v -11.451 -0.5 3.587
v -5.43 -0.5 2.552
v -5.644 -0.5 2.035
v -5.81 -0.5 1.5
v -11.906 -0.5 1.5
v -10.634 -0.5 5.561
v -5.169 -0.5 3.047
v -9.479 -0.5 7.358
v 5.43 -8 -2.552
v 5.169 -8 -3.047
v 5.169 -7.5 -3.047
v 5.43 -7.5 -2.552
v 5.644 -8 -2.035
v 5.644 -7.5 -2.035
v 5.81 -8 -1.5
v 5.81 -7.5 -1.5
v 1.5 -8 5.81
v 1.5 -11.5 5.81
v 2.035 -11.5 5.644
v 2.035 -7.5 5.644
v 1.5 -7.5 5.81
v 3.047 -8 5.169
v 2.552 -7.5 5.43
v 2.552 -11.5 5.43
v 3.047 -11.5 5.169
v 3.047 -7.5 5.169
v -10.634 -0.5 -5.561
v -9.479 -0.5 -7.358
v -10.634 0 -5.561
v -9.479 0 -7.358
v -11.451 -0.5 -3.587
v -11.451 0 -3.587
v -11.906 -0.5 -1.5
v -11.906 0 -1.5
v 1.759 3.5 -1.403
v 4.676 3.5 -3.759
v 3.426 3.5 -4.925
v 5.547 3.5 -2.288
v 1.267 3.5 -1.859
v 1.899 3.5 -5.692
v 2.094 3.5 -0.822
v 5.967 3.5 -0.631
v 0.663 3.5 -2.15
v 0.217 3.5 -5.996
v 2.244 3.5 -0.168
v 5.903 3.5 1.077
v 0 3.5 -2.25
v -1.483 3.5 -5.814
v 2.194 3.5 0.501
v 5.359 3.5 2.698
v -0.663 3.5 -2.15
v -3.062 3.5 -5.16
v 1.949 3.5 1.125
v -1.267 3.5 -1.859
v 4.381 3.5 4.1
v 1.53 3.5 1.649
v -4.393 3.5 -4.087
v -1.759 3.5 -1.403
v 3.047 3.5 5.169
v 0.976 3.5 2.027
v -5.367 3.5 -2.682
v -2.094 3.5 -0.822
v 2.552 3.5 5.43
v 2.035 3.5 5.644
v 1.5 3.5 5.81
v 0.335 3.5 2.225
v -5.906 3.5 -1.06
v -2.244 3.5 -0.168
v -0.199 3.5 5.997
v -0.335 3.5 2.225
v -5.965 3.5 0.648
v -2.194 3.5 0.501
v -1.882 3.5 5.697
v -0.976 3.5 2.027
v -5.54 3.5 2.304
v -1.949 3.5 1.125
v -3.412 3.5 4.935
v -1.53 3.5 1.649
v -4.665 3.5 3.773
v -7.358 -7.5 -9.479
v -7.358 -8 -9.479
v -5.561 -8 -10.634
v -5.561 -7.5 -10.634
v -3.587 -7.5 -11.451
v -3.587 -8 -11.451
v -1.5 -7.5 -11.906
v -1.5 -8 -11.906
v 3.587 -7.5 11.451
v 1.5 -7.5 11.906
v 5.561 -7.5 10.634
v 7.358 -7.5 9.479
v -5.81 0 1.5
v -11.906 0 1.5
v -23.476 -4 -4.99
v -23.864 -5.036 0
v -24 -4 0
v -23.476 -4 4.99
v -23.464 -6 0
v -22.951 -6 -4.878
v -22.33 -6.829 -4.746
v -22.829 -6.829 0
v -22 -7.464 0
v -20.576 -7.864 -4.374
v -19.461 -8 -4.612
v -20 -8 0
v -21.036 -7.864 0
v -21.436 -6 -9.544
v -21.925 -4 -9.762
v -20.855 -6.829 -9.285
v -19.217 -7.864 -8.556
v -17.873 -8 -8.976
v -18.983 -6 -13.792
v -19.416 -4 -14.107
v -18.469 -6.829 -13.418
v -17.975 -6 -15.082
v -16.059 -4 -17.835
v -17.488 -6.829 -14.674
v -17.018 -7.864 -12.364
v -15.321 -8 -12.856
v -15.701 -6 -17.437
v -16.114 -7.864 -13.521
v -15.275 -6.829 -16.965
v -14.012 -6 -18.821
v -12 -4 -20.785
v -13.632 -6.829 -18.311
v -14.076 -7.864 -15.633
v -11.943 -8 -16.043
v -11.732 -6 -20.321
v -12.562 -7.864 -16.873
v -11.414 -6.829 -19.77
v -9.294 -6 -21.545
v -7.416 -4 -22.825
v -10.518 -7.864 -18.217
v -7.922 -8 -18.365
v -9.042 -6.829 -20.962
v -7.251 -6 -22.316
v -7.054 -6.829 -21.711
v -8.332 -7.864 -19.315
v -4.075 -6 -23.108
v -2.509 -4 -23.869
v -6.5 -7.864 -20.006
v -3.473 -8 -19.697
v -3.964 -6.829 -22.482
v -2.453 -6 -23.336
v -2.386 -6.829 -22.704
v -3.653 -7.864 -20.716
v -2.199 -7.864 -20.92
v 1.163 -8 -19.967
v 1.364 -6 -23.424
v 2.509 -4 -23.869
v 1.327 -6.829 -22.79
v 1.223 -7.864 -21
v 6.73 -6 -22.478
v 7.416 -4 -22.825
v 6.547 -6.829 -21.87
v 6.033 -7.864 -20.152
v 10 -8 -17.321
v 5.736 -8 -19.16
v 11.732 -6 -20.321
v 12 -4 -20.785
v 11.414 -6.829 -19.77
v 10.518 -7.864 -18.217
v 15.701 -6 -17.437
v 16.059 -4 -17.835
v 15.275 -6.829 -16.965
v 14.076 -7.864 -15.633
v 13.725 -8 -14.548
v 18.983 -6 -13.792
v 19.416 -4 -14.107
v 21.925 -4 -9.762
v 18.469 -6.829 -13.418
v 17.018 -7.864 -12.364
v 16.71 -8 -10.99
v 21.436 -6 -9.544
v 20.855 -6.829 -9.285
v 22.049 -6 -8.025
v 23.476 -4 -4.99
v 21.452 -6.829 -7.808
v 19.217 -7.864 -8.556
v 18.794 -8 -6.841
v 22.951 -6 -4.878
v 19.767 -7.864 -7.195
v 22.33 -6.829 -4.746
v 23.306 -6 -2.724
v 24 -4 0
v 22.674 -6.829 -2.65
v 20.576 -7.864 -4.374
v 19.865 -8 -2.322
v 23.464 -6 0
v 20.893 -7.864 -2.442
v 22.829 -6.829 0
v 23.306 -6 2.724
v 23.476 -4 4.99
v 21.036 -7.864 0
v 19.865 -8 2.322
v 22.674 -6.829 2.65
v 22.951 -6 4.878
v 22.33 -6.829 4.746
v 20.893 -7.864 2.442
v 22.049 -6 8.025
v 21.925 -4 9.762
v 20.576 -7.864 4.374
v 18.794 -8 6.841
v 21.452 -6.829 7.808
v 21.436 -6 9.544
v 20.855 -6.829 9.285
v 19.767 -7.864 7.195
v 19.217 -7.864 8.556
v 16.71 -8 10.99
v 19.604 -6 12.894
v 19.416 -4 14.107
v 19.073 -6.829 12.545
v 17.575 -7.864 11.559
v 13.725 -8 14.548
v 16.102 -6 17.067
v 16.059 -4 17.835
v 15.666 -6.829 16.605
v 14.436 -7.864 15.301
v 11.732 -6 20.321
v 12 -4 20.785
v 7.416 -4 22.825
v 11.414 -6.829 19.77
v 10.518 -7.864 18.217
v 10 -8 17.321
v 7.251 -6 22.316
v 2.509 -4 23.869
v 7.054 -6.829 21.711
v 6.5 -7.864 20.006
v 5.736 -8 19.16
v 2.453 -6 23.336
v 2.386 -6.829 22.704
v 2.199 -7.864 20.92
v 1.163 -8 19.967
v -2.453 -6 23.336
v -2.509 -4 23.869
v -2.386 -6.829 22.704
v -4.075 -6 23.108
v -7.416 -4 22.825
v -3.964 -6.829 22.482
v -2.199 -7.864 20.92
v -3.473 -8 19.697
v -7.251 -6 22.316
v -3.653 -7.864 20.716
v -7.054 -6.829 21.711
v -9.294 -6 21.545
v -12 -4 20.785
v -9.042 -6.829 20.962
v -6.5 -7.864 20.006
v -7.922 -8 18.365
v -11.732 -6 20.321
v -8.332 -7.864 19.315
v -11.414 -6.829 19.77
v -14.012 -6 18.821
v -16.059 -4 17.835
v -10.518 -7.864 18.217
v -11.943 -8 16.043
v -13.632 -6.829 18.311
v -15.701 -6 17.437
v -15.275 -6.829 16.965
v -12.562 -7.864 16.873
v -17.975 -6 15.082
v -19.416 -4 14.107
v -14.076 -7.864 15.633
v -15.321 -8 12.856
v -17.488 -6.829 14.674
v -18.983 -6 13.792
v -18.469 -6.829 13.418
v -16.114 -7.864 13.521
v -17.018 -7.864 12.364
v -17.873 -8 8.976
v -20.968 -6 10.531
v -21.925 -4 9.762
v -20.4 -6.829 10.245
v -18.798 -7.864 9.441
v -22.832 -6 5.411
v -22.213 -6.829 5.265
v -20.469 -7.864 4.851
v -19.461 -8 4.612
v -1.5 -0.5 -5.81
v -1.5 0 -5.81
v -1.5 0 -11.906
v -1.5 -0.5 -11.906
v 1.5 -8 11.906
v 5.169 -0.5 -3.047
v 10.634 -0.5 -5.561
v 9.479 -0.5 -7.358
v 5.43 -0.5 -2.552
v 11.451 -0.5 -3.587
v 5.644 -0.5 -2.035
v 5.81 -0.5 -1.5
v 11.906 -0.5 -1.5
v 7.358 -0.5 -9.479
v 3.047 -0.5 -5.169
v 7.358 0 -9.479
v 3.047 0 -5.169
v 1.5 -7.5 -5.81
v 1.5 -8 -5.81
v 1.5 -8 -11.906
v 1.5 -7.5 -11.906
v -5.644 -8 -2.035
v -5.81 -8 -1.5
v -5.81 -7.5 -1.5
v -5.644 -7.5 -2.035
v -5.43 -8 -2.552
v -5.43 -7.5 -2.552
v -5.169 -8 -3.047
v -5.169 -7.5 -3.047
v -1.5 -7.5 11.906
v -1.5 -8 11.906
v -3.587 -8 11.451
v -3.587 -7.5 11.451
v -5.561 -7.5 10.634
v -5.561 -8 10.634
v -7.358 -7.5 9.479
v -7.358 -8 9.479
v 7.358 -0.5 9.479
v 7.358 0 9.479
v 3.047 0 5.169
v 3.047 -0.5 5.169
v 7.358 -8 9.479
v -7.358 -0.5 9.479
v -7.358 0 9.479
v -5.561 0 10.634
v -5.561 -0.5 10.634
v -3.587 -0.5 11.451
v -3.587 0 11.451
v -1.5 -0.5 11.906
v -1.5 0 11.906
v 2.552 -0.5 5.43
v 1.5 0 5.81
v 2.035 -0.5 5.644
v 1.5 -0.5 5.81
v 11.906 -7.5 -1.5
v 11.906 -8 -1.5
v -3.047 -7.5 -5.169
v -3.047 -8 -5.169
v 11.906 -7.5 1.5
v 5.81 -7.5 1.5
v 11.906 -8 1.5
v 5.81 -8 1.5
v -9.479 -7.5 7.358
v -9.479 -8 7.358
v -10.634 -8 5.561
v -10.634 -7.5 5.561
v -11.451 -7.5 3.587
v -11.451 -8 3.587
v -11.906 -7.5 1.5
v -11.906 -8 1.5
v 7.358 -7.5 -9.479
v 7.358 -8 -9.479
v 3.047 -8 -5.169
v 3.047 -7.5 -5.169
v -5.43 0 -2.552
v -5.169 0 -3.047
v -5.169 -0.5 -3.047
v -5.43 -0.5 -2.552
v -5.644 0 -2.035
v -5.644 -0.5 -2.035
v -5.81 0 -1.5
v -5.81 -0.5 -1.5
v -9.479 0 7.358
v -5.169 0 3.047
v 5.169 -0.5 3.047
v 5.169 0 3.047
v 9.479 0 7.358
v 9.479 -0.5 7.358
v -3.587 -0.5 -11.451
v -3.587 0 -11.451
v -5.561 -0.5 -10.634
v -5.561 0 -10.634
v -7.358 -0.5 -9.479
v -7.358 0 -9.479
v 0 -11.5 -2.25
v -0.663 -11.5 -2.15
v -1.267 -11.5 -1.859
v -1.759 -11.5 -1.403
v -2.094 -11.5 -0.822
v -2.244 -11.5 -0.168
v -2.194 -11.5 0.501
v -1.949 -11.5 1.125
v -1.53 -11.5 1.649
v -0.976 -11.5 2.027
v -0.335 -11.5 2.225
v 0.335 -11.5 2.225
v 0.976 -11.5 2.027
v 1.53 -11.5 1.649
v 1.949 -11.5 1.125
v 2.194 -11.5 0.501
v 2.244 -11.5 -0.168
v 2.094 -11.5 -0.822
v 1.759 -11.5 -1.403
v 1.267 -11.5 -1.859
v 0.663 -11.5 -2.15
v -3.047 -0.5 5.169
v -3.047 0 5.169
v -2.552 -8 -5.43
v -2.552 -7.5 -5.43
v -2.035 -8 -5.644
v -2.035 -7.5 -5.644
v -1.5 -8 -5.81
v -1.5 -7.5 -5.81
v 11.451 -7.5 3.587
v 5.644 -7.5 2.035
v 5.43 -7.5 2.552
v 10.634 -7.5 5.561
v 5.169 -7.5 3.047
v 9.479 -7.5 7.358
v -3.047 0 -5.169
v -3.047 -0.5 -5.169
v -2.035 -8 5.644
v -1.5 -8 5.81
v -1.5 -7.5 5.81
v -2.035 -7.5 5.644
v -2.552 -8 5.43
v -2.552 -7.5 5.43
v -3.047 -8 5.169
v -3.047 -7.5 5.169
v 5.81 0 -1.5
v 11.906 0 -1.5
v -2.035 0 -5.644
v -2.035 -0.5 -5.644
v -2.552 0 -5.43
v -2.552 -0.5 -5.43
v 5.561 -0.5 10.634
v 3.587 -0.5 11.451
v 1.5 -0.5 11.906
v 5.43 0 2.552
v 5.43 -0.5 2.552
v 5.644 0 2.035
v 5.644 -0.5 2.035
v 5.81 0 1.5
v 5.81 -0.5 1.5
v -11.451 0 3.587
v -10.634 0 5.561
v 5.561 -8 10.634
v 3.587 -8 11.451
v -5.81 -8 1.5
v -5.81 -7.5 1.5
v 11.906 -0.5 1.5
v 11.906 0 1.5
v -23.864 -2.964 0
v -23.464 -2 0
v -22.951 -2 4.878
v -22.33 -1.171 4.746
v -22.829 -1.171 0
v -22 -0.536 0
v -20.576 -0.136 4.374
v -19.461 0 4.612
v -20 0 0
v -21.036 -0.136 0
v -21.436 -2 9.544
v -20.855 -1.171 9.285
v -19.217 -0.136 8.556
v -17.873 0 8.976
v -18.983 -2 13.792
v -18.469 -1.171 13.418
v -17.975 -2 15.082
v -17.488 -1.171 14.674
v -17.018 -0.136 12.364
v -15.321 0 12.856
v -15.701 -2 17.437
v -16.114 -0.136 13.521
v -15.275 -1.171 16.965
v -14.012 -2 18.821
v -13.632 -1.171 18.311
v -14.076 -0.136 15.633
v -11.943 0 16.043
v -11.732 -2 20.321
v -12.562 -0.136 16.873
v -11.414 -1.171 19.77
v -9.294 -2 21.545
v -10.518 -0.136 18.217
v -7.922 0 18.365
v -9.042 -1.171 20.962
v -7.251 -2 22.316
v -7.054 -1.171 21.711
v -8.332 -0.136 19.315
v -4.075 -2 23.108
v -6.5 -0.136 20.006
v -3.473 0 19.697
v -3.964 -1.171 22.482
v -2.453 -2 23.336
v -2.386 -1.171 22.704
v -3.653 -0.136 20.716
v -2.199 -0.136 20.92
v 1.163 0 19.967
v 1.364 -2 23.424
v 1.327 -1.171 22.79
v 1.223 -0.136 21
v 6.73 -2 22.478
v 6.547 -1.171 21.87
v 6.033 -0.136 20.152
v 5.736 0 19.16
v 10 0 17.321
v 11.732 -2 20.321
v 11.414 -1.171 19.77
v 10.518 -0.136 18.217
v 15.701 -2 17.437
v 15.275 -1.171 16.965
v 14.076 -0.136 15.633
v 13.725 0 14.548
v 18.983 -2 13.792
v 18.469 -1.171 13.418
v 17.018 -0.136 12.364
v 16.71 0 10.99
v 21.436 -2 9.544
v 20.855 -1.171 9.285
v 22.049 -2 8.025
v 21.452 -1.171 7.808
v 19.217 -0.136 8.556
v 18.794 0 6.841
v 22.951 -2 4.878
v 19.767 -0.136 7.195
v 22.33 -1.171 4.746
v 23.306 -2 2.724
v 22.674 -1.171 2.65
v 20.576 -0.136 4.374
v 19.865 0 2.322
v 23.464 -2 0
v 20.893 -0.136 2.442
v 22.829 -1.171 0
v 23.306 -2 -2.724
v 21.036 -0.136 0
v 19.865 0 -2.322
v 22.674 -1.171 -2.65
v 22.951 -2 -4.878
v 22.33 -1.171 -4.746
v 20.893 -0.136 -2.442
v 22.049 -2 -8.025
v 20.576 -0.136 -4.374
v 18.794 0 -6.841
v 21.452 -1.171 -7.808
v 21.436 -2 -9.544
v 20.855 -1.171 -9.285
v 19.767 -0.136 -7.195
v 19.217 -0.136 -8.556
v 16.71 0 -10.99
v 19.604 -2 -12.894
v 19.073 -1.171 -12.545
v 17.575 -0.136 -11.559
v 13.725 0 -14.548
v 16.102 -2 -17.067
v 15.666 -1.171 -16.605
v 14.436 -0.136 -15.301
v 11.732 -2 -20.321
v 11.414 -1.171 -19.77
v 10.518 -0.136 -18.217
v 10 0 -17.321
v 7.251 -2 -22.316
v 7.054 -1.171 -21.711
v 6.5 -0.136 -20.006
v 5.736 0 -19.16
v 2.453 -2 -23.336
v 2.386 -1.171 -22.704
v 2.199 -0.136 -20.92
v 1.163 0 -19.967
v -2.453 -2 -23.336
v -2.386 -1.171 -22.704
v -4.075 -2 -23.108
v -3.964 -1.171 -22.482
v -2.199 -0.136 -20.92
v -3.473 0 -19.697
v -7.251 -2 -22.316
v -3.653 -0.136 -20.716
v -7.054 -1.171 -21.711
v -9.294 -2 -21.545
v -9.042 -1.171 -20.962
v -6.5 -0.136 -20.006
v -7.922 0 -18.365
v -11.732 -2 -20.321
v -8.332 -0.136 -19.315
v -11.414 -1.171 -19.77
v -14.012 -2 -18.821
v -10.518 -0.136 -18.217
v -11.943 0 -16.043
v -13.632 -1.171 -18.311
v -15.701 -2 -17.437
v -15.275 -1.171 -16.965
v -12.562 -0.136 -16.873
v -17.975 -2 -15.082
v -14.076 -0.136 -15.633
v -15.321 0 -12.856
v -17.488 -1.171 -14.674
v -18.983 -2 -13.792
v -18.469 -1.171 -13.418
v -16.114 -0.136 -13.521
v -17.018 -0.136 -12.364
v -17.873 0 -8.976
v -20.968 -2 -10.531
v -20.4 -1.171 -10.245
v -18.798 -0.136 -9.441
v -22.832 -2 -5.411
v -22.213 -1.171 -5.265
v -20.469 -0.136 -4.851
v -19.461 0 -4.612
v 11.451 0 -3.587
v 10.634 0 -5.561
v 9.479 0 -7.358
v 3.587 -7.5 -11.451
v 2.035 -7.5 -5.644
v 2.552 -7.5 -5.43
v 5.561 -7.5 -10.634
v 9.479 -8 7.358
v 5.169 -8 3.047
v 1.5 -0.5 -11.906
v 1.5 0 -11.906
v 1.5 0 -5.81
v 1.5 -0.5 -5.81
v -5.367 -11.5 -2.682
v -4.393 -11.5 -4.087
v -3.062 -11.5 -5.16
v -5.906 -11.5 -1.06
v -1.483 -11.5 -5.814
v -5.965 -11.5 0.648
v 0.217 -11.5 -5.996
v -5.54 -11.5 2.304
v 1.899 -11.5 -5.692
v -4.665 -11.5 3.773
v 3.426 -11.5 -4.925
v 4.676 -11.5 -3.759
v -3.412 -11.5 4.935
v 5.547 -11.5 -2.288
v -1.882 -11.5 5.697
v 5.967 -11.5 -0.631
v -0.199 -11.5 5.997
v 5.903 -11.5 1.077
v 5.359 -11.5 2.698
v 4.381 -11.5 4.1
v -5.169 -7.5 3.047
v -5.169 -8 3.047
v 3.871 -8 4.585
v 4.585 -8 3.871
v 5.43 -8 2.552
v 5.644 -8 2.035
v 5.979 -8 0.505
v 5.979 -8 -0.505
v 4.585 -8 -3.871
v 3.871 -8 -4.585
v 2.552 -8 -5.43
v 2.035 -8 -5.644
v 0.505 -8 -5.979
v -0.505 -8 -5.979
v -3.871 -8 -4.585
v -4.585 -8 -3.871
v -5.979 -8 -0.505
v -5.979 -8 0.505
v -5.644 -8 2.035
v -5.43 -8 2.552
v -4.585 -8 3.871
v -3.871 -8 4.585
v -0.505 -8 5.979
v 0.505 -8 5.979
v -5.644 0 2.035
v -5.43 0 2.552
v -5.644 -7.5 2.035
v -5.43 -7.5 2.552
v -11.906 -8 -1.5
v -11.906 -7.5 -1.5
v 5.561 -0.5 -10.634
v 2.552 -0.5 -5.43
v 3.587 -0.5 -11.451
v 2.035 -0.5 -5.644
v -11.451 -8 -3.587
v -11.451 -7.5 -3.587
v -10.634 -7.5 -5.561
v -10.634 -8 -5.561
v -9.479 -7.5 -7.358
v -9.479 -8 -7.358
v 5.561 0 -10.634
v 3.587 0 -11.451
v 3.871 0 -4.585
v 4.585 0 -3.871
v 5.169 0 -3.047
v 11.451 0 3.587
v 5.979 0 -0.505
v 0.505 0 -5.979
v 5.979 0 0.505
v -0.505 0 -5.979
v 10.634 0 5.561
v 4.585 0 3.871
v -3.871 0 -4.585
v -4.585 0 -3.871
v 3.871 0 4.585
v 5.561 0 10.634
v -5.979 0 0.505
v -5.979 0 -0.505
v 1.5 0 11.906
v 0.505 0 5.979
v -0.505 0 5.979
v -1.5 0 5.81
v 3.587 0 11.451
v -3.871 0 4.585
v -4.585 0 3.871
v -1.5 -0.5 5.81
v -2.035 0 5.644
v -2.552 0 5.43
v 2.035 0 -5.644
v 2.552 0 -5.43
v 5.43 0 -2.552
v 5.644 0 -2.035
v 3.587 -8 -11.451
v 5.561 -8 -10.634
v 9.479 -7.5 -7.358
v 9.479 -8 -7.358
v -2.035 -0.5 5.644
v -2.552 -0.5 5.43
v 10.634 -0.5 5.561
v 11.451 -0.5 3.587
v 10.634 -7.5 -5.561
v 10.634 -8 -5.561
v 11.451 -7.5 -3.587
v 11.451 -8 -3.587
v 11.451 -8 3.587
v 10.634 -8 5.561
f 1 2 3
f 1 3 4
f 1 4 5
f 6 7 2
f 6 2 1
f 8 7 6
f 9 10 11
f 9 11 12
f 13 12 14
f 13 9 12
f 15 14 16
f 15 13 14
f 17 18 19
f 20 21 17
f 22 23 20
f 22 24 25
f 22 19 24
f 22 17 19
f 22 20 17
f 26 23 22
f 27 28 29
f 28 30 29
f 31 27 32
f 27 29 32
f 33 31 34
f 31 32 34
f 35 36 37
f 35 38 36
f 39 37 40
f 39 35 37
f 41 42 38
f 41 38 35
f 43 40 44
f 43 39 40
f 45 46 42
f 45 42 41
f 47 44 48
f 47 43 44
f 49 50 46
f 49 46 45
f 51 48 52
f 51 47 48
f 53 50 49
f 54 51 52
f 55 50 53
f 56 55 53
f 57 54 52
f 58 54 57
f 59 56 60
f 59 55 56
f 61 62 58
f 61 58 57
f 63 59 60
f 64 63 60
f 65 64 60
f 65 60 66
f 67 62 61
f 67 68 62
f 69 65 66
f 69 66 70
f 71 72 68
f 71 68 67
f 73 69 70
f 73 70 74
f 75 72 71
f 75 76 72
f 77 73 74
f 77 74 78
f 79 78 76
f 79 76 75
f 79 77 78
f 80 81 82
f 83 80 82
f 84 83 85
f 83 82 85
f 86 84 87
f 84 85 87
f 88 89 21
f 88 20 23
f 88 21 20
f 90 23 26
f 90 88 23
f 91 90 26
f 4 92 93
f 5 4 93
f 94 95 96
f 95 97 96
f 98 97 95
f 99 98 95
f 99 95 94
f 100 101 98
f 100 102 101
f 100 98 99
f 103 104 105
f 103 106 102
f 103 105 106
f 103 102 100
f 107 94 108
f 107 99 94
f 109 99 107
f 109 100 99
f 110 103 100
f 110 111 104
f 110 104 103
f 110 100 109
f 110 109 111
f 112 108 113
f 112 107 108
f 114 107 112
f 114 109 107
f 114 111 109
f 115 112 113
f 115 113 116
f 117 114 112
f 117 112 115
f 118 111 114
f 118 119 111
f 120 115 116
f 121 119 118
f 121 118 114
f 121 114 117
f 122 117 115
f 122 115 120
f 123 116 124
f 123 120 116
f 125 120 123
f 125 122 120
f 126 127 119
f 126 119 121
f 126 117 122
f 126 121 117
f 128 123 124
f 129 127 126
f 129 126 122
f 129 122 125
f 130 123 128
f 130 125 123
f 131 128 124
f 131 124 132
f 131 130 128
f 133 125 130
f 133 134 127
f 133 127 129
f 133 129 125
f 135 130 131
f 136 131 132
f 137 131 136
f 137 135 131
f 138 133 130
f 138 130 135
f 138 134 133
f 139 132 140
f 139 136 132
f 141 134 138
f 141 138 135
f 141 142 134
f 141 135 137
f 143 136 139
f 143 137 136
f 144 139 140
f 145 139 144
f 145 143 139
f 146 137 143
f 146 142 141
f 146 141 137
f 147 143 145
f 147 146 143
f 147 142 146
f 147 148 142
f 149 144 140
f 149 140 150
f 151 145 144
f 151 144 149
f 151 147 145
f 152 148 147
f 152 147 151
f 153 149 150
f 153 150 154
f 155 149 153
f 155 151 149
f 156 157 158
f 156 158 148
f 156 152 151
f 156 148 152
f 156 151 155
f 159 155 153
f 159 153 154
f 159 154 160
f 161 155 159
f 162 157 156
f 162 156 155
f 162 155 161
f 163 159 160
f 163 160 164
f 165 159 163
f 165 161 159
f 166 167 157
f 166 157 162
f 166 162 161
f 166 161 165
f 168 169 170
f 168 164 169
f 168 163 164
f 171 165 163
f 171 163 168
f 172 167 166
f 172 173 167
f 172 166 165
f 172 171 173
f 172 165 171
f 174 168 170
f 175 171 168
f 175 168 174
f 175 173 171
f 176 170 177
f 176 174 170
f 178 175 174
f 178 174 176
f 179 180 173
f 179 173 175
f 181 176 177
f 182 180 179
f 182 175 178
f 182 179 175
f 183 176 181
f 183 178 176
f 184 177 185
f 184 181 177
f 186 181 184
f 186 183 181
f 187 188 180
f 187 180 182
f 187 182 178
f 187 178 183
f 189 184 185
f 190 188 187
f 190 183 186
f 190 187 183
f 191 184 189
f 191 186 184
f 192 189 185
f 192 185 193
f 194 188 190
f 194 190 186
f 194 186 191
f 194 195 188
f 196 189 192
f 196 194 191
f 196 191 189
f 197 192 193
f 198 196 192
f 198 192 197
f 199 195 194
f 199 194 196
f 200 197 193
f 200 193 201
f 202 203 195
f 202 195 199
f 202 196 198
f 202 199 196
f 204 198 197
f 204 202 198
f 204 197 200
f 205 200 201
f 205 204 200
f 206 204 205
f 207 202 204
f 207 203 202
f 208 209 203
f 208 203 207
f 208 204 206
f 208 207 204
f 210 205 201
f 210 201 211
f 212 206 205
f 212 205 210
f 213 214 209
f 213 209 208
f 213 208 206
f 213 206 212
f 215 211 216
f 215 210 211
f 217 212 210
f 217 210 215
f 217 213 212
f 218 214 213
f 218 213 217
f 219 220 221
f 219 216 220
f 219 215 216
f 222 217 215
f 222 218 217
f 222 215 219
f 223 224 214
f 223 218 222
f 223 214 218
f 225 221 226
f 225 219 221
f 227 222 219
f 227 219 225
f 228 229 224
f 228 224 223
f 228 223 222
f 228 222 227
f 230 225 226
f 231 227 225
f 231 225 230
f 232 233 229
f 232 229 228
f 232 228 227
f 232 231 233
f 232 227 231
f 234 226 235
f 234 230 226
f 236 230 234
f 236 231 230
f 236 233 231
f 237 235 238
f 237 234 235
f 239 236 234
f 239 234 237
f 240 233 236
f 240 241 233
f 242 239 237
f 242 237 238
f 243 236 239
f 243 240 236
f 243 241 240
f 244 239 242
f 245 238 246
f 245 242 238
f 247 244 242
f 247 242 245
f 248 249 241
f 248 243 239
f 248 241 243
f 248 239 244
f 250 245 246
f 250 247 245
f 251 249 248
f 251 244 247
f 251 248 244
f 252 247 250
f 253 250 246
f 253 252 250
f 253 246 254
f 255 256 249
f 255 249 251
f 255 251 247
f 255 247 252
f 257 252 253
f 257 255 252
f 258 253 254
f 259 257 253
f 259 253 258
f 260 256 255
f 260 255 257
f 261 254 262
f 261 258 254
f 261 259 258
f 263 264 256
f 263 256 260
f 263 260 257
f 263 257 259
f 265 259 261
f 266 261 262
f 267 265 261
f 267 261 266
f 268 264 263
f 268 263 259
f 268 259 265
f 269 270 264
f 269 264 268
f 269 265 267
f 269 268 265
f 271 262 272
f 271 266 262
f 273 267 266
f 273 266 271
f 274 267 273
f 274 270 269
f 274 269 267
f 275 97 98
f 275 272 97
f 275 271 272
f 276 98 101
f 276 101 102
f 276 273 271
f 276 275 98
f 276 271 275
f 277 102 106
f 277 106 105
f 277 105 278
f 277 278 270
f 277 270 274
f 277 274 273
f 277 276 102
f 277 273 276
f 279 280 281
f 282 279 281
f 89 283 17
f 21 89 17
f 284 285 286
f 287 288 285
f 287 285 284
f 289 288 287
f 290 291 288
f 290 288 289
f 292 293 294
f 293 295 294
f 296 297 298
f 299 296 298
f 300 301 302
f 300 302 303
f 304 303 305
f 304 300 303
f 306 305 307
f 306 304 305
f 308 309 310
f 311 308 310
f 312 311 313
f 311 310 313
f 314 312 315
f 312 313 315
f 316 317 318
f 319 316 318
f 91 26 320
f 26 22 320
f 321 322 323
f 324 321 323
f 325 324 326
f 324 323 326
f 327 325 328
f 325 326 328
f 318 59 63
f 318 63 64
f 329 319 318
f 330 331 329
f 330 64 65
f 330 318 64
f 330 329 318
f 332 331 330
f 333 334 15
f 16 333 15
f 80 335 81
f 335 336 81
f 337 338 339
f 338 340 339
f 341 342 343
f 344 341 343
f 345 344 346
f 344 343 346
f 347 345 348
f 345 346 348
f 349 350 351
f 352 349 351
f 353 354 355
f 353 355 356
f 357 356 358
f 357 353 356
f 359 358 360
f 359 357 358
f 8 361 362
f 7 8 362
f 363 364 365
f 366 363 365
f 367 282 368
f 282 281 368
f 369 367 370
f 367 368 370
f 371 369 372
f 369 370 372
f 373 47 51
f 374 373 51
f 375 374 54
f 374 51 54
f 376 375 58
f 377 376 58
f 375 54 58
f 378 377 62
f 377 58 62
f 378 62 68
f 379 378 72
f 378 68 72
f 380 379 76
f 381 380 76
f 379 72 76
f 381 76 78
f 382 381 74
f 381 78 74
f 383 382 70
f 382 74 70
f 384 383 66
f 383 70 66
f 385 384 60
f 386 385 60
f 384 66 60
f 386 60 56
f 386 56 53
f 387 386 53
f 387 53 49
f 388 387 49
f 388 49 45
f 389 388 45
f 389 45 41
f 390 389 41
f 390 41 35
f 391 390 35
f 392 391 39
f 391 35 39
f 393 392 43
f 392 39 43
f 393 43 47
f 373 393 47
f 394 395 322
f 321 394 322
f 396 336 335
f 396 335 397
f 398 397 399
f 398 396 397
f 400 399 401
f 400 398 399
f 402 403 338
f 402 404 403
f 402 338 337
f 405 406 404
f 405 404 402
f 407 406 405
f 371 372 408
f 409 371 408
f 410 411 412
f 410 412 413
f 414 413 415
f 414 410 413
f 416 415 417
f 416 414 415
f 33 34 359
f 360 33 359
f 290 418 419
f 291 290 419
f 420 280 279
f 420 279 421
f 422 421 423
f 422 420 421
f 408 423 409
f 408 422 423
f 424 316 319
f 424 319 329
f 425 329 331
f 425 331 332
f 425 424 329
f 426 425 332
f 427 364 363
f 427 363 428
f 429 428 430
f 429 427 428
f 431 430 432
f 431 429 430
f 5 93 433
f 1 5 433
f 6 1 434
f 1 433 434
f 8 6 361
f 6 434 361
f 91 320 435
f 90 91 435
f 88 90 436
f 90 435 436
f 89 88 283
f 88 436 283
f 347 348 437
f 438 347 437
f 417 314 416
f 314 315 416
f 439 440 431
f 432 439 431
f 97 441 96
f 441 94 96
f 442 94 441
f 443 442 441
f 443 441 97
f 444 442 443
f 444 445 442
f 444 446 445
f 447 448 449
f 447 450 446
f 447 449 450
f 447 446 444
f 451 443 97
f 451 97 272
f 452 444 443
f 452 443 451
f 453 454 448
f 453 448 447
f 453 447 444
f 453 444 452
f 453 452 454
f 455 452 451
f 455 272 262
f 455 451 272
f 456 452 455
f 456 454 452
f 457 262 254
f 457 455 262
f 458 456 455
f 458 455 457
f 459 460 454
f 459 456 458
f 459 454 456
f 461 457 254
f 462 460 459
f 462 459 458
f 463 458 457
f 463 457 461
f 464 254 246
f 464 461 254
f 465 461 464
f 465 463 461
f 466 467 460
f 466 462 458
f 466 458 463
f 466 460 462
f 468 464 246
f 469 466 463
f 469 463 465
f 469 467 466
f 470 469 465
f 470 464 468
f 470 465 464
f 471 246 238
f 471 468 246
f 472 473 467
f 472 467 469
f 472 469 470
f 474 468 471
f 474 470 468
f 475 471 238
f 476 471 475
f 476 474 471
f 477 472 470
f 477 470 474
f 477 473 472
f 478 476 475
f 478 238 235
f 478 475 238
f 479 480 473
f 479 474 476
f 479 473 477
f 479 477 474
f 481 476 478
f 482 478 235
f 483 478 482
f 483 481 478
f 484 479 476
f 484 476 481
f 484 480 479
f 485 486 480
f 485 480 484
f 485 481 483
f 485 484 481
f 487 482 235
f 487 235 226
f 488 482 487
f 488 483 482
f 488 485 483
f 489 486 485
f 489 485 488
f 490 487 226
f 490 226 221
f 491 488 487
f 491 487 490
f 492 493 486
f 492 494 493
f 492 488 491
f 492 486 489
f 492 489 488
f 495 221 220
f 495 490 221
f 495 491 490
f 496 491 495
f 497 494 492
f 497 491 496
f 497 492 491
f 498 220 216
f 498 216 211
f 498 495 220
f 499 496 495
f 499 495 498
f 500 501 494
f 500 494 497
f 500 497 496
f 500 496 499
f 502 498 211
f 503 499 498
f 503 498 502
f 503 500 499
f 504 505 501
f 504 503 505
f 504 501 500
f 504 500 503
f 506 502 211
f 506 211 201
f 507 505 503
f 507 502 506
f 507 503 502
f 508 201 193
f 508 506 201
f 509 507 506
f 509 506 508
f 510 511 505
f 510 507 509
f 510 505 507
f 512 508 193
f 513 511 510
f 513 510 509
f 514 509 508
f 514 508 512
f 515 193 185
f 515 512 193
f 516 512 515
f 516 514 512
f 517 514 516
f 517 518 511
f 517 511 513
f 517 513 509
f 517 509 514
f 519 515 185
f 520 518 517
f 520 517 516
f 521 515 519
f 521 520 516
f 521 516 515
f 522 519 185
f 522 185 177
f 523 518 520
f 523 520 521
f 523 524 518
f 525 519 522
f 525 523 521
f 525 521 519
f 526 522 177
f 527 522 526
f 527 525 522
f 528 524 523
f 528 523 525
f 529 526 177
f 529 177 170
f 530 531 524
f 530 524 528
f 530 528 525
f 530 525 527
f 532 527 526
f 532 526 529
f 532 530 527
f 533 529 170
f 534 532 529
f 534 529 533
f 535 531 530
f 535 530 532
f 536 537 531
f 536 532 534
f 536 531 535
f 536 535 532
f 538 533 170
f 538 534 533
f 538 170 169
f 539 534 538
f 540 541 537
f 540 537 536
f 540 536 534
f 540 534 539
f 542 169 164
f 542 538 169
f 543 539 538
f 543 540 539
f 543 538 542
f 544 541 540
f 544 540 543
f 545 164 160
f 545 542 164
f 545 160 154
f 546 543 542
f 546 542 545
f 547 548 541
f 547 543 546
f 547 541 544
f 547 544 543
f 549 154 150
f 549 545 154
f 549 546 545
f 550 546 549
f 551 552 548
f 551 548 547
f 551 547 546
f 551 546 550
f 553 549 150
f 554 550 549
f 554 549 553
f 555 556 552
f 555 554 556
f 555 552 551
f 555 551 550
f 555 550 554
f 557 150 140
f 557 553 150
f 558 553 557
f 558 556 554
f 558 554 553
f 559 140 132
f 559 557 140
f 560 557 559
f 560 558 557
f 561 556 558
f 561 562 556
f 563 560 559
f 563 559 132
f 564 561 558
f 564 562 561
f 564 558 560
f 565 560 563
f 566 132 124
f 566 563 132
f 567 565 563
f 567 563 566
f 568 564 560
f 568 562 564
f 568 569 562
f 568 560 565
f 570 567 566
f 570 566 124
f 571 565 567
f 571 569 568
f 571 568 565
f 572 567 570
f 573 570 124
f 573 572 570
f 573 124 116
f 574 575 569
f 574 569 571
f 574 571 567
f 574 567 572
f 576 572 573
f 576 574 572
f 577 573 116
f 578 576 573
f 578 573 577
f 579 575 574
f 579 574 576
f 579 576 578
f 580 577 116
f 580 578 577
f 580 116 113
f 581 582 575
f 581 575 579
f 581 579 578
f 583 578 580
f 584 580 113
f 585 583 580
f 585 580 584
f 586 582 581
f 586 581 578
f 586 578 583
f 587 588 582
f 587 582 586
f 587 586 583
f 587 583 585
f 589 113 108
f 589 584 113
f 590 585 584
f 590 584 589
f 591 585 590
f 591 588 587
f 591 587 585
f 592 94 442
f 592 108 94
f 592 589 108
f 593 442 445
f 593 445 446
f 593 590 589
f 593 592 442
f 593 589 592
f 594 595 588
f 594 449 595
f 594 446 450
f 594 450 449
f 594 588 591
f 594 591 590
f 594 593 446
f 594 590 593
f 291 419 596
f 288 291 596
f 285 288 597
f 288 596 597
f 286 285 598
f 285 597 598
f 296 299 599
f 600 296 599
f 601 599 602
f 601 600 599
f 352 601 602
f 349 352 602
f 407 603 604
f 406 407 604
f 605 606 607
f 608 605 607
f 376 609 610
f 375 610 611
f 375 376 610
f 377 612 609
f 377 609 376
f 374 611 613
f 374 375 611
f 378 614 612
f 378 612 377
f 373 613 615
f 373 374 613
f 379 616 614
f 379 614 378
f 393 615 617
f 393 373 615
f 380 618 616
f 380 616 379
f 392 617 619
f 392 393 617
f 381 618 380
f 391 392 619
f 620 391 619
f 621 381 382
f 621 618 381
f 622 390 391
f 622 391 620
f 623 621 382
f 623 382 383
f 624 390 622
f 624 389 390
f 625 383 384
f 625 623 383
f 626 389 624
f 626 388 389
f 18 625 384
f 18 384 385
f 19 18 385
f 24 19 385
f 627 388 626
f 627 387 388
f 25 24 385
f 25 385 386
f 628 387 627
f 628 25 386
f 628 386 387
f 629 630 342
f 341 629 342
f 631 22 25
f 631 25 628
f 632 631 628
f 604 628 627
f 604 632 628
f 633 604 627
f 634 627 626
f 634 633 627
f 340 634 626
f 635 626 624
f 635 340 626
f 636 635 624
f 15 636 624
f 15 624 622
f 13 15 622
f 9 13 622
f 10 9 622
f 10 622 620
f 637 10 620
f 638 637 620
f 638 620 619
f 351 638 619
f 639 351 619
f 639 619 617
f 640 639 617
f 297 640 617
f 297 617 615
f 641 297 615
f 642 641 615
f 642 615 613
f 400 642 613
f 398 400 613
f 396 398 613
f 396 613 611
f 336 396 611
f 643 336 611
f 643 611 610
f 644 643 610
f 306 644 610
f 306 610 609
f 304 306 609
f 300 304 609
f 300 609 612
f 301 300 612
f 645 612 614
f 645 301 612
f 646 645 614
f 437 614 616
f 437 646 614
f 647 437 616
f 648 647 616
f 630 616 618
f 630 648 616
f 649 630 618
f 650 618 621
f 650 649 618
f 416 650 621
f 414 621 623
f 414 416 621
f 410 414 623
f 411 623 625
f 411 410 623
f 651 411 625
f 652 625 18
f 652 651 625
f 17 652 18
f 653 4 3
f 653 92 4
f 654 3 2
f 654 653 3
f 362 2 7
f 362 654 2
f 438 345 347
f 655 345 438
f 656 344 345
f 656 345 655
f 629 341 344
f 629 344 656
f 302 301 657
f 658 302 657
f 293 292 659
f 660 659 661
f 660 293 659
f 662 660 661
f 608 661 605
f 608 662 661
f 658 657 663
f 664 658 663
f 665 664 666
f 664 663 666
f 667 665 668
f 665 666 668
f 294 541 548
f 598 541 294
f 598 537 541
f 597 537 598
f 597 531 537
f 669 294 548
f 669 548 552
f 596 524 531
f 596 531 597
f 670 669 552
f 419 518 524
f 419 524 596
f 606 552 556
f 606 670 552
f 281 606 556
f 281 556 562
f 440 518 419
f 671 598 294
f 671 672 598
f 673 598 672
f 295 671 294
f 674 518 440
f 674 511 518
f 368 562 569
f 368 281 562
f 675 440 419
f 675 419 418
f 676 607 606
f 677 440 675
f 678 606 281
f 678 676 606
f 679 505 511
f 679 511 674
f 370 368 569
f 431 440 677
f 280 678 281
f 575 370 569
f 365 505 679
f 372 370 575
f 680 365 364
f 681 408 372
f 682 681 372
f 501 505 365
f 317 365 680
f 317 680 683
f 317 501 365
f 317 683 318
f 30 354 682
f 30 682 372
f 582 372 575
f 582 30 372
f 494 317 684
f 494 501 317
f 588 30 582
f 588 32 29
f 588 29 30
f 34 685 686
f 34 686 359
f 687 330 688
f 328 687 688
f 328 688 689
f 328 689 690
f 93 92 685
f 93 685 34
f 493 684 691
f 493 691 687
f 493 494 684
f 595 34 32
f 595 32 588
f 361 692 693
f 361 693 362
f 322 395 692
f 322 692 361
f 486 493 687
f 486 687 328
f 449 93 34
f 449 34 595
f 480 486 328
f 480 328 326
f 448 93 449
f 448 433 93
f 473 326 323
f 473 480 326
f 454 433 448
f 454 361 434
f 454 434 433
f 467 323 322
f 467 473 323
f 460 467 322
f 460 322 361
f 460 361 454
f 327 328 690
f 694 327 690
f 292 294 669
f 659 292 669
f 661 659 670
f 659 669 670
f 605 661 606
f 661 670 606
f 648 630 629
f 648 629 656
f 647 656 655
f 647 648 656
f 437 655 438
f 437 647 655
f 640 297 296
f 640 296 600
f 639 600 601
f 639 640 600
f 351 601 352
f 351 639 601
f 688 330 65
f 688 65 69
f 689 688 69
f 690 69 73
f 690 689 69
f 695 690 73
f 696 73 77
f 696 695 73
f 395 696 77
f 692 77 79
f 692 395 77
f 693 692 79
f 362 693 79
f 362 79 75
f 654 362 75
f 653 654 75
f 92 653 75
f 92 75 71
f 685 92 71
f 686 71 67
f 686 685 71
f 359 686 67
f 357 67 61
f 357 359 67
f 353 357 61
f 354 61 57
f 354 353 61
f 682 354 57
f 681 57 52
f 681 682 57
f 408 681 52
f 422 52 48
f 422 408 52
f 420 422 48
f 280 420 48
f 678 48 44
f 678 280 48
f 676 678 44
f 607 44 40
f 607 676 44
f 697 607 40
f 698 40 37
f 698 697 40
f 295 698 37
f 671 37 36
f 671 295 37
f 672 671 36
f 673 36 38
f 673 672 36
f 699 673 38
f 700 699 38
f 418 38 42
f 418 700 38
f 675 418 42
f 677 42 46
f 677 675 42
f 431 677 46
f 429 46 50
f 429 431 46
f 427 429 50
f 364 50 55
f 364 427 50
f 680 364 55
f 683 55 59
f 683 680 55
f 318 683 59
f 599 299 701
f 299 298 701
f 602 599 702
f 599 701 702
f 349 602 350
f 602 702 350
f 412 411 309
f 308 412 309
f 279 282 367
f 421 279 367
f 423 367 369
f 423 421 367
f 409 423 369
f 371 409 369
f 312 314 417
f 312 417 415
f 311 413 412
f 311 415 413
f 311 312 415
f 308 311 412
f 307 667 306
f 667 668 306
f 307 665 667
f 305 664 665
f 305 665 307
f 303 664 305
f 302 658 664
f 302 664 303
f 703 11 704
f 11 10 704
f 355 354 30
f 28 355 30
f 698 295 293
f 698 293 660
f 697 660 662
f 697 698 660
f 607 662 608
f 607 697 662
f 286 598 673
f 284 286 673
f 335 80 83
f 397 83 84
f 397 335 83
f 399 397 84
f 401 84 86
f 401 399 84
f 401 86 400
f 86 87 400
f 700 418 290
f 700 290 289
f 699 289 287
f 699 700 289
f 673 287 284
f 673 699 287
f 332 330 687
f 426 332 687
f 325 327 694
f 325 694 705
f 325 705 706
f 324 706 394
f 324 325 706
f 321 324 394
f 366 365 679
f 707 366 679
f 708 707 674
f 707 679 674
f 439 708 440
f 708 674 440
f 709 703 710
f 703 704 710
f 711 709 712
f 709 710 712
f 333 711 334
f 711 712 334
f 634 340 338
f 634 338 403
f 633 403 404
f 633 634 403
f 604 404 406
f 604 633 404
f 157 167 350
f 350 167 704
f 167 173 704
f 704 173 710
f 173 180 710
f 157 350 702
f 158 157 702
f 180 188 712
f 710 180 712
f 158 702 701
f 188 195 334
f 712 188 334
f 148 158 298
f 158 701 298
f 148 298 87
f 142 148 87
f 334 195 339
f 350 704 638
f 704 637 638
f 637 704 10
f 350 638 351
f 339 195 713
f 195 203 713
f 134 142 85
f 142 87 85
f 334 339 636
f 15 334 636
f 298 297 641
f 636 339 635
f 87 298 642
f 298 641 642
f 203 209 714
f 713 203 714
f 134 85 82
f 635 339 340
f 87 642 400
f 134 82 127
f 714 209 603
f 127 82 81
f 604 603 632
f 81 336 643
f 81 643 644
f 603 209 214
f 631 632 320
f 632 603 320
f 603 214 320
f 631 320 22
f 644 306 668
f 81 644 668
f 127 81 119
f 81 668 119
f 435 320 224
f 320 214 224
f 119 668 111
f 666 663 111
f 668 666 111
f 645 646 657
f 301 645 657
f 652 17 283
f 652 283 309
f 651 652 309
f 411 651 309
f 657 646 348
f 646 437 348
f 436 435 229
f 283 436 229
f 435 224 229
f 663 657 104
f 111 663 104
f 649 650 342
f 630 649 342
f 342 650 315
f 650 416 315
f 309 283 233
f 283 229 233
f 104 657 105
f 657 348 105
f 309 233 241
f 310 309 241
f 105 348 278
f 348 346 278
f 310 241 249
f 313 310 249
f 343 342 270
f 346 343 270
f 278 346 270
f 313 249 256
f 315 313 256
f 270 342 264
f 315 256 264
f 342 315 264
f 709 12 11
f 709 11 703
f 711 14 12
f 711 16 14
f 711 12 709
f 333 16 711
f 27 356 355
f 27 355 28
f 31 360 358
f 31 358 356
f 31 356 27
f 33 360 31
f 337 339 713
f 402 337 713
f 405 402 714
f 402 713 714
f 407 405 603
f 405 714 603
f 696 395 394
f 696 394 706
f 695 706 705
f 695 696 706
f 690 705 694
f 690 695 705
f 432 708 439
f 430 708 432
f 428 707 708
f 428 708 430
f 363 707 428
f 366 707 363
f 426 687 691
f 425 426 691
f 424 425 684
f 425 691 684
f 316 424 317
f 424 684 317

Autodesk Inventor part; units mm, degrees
ref_plane "YZ Plane" through (0, 0, 0) normal (1, 0, 0) x (0, 1, 0)
ref_plane "XZ Plane" through (0, 0, 0) normal (0, 1, 0) x (-1, 0, 0)
sketch "Sketch1" plane through (0, 0, 0) normal (0, 1, 0) x (-1, 0, 0)
  circle A0 centre (0, 0) radius 24
  dimension "d0" = 48
extrude "Extrusion1" add sketch "Sketch1" against normal blind 8
fillet "Fillet1" radius 4 2 edges at (24, 0, 0) (24, -8, 0)
sketch "Sketch2" plane through (0, -8, 0) normal (0, -1, 0) x (1, 0, 0)
  circle A0 centre (0, 0) radius 12
  line L0 (-7.3581, 9.4794) -> (-3.0473, 5.1686)
  arc A1 (-1.5, 5.8095) -> (-3.0473, 5.1686) centre (0, 0) ccw
  line L1 (-1.5, 5.8095) -> (-1.5, 11.9059)
  arc A2 (-1.5, 11.9059) -> (-7.3581, 9.4794) centre (0, 0) ccw
  line L2 (3.0473, 5.1686) -> (7.3581, 9.4794)
  arc A3 (7.3581, 9.4794) -> (1.5, 11.9059) centre (0, 0) ccw
  line L3 (1.5, 11.9059) -> (1.5, 5.8095)
  arc A4 (3.0473, 5.1686) -> (1.5, 5.8095) centre (0, 0) ccw
  line L4 (9.4794, 7.3581) -> (5.1686, 3.0473)
  arc A5 (5.8095, 1.5) -> (5.1686, 3.0473) centre (0, 0) ccw
  line L5 (5.8095, 1.5) -> (11.9059, 1.5)
  arc A6 (11.9059, 1.5) -> (9.4794, 7.3581) centre (0, 0) ccw
  line L6 (11.9059, -1.5) -> (5.8095, -1.5)
  arc A7 (5.1686, -3.0473) -> (5.8095, -1.5) centre (0, 0) ccw
  line L7 (5.1686, -3.0473) -> (9.4794, -7.3581)
  arc A8 (9.4794, -7.3581) -> (11.9059, -1.5) centre (0, 0) ccw
  line L8 (7.3581, -9.4794) -> (3.0473, -5.1686)
  arc A9 (1.5, -5.8095) -> (3.0473, -5.1686) centre (0, 0) ccw
  line L9 (1.5, -5.8095) -> (1.5, -11.9059)
  arc A10 (1.5, -11.9059) -> (7.3581, -9.4794) centre (0, 0) ccw
  line L10 (-3.0473, -5.1686) -> (-7.3581, -9.4794)
  arc A11 (-7.3581, -9.4794) -> (-1.5, -11.9059) centre (0, 0) ccw
  line L11 (-1.5, -11.9059) -> (-1.5, -5.8095)
  arc A12 (-3.0473, -5.1686) -> (-1.5, -5.8095) centre (0, 0) ccw
  line L12 (-9.4794, -7.3581) -> (-5.1686, -3.0473)
  arc A13 (-5.8095, -1.5) -> (-5.1686, -3.0473) centre (0, 0) ccw
  line L13 (-5.8095, -1.5) -> (-11.9059, -1.5)
  arc A14 (-11.9059, -1.5) -> (-9.4794, -7.3581) centre (0, 0) ccw
  line L14 (-5.1686, 3.0473) -> (-9.4794, 7.3581)
  arc A15 (-9.4794, 7.3581) -> (-11.9059, 1.5) centre (0, 0) ccw
  line L15 (-11.9059, 1.5) -> (-5.8095, 1.5)
  arc A16 (-5.1686, 3.0473) -> (-5.8095, 1.5) centre (0, 0) ccw
  circle A17 centre (0, 0) radius 6
  circle A18 centre (0, 0) radius 2.1
  point P0 (-6, 0)
extrude "Extrusion2" cut sketch "Sketch2" against normal blind 0.5 contours L5 A5 L4 A0 | A0 L7 A7 L6 | L2 A4 L3 A0 | A0 L9 A9 L8 | L1 A1 L0 A0 | A0 L10 A12 L11 | L14 A16 L15 A0 | A0 L13 A13 L12
sketch "Sketch3" plane through (0, -8, 0) normal (0, -1, 0) x (1, 0, 0)
  arc A0 (3.0473, 5.1686) -> (1.5, 5.8095) centre (0, 0) ccw projected
  circle A1 centre (0, 0) radius 6
extrude "Extrusion3" add sketch "Sketch3" along normal blind 3.5
ref_plane "Work Plane1" through (0, -4, 0) normal (0, -1, 0) x (1, 0, 0)
mirror "Mirror1" about plane through (0, -4, 0) normal (0, -1, 0) of "Extrusion2", "Extrusion3"
sketch "Sketch4" plane through (0, -11.5, 0) normal (0, -1, 0) x (1, 0, 0)
  point P0 (0, 0)
hole "Hole1" at (0, -11.5, 0) direction (0, 1, 0) diameter 4.5 end through all
properties part number "13-0003" material "Polystyrene, High Impact"
